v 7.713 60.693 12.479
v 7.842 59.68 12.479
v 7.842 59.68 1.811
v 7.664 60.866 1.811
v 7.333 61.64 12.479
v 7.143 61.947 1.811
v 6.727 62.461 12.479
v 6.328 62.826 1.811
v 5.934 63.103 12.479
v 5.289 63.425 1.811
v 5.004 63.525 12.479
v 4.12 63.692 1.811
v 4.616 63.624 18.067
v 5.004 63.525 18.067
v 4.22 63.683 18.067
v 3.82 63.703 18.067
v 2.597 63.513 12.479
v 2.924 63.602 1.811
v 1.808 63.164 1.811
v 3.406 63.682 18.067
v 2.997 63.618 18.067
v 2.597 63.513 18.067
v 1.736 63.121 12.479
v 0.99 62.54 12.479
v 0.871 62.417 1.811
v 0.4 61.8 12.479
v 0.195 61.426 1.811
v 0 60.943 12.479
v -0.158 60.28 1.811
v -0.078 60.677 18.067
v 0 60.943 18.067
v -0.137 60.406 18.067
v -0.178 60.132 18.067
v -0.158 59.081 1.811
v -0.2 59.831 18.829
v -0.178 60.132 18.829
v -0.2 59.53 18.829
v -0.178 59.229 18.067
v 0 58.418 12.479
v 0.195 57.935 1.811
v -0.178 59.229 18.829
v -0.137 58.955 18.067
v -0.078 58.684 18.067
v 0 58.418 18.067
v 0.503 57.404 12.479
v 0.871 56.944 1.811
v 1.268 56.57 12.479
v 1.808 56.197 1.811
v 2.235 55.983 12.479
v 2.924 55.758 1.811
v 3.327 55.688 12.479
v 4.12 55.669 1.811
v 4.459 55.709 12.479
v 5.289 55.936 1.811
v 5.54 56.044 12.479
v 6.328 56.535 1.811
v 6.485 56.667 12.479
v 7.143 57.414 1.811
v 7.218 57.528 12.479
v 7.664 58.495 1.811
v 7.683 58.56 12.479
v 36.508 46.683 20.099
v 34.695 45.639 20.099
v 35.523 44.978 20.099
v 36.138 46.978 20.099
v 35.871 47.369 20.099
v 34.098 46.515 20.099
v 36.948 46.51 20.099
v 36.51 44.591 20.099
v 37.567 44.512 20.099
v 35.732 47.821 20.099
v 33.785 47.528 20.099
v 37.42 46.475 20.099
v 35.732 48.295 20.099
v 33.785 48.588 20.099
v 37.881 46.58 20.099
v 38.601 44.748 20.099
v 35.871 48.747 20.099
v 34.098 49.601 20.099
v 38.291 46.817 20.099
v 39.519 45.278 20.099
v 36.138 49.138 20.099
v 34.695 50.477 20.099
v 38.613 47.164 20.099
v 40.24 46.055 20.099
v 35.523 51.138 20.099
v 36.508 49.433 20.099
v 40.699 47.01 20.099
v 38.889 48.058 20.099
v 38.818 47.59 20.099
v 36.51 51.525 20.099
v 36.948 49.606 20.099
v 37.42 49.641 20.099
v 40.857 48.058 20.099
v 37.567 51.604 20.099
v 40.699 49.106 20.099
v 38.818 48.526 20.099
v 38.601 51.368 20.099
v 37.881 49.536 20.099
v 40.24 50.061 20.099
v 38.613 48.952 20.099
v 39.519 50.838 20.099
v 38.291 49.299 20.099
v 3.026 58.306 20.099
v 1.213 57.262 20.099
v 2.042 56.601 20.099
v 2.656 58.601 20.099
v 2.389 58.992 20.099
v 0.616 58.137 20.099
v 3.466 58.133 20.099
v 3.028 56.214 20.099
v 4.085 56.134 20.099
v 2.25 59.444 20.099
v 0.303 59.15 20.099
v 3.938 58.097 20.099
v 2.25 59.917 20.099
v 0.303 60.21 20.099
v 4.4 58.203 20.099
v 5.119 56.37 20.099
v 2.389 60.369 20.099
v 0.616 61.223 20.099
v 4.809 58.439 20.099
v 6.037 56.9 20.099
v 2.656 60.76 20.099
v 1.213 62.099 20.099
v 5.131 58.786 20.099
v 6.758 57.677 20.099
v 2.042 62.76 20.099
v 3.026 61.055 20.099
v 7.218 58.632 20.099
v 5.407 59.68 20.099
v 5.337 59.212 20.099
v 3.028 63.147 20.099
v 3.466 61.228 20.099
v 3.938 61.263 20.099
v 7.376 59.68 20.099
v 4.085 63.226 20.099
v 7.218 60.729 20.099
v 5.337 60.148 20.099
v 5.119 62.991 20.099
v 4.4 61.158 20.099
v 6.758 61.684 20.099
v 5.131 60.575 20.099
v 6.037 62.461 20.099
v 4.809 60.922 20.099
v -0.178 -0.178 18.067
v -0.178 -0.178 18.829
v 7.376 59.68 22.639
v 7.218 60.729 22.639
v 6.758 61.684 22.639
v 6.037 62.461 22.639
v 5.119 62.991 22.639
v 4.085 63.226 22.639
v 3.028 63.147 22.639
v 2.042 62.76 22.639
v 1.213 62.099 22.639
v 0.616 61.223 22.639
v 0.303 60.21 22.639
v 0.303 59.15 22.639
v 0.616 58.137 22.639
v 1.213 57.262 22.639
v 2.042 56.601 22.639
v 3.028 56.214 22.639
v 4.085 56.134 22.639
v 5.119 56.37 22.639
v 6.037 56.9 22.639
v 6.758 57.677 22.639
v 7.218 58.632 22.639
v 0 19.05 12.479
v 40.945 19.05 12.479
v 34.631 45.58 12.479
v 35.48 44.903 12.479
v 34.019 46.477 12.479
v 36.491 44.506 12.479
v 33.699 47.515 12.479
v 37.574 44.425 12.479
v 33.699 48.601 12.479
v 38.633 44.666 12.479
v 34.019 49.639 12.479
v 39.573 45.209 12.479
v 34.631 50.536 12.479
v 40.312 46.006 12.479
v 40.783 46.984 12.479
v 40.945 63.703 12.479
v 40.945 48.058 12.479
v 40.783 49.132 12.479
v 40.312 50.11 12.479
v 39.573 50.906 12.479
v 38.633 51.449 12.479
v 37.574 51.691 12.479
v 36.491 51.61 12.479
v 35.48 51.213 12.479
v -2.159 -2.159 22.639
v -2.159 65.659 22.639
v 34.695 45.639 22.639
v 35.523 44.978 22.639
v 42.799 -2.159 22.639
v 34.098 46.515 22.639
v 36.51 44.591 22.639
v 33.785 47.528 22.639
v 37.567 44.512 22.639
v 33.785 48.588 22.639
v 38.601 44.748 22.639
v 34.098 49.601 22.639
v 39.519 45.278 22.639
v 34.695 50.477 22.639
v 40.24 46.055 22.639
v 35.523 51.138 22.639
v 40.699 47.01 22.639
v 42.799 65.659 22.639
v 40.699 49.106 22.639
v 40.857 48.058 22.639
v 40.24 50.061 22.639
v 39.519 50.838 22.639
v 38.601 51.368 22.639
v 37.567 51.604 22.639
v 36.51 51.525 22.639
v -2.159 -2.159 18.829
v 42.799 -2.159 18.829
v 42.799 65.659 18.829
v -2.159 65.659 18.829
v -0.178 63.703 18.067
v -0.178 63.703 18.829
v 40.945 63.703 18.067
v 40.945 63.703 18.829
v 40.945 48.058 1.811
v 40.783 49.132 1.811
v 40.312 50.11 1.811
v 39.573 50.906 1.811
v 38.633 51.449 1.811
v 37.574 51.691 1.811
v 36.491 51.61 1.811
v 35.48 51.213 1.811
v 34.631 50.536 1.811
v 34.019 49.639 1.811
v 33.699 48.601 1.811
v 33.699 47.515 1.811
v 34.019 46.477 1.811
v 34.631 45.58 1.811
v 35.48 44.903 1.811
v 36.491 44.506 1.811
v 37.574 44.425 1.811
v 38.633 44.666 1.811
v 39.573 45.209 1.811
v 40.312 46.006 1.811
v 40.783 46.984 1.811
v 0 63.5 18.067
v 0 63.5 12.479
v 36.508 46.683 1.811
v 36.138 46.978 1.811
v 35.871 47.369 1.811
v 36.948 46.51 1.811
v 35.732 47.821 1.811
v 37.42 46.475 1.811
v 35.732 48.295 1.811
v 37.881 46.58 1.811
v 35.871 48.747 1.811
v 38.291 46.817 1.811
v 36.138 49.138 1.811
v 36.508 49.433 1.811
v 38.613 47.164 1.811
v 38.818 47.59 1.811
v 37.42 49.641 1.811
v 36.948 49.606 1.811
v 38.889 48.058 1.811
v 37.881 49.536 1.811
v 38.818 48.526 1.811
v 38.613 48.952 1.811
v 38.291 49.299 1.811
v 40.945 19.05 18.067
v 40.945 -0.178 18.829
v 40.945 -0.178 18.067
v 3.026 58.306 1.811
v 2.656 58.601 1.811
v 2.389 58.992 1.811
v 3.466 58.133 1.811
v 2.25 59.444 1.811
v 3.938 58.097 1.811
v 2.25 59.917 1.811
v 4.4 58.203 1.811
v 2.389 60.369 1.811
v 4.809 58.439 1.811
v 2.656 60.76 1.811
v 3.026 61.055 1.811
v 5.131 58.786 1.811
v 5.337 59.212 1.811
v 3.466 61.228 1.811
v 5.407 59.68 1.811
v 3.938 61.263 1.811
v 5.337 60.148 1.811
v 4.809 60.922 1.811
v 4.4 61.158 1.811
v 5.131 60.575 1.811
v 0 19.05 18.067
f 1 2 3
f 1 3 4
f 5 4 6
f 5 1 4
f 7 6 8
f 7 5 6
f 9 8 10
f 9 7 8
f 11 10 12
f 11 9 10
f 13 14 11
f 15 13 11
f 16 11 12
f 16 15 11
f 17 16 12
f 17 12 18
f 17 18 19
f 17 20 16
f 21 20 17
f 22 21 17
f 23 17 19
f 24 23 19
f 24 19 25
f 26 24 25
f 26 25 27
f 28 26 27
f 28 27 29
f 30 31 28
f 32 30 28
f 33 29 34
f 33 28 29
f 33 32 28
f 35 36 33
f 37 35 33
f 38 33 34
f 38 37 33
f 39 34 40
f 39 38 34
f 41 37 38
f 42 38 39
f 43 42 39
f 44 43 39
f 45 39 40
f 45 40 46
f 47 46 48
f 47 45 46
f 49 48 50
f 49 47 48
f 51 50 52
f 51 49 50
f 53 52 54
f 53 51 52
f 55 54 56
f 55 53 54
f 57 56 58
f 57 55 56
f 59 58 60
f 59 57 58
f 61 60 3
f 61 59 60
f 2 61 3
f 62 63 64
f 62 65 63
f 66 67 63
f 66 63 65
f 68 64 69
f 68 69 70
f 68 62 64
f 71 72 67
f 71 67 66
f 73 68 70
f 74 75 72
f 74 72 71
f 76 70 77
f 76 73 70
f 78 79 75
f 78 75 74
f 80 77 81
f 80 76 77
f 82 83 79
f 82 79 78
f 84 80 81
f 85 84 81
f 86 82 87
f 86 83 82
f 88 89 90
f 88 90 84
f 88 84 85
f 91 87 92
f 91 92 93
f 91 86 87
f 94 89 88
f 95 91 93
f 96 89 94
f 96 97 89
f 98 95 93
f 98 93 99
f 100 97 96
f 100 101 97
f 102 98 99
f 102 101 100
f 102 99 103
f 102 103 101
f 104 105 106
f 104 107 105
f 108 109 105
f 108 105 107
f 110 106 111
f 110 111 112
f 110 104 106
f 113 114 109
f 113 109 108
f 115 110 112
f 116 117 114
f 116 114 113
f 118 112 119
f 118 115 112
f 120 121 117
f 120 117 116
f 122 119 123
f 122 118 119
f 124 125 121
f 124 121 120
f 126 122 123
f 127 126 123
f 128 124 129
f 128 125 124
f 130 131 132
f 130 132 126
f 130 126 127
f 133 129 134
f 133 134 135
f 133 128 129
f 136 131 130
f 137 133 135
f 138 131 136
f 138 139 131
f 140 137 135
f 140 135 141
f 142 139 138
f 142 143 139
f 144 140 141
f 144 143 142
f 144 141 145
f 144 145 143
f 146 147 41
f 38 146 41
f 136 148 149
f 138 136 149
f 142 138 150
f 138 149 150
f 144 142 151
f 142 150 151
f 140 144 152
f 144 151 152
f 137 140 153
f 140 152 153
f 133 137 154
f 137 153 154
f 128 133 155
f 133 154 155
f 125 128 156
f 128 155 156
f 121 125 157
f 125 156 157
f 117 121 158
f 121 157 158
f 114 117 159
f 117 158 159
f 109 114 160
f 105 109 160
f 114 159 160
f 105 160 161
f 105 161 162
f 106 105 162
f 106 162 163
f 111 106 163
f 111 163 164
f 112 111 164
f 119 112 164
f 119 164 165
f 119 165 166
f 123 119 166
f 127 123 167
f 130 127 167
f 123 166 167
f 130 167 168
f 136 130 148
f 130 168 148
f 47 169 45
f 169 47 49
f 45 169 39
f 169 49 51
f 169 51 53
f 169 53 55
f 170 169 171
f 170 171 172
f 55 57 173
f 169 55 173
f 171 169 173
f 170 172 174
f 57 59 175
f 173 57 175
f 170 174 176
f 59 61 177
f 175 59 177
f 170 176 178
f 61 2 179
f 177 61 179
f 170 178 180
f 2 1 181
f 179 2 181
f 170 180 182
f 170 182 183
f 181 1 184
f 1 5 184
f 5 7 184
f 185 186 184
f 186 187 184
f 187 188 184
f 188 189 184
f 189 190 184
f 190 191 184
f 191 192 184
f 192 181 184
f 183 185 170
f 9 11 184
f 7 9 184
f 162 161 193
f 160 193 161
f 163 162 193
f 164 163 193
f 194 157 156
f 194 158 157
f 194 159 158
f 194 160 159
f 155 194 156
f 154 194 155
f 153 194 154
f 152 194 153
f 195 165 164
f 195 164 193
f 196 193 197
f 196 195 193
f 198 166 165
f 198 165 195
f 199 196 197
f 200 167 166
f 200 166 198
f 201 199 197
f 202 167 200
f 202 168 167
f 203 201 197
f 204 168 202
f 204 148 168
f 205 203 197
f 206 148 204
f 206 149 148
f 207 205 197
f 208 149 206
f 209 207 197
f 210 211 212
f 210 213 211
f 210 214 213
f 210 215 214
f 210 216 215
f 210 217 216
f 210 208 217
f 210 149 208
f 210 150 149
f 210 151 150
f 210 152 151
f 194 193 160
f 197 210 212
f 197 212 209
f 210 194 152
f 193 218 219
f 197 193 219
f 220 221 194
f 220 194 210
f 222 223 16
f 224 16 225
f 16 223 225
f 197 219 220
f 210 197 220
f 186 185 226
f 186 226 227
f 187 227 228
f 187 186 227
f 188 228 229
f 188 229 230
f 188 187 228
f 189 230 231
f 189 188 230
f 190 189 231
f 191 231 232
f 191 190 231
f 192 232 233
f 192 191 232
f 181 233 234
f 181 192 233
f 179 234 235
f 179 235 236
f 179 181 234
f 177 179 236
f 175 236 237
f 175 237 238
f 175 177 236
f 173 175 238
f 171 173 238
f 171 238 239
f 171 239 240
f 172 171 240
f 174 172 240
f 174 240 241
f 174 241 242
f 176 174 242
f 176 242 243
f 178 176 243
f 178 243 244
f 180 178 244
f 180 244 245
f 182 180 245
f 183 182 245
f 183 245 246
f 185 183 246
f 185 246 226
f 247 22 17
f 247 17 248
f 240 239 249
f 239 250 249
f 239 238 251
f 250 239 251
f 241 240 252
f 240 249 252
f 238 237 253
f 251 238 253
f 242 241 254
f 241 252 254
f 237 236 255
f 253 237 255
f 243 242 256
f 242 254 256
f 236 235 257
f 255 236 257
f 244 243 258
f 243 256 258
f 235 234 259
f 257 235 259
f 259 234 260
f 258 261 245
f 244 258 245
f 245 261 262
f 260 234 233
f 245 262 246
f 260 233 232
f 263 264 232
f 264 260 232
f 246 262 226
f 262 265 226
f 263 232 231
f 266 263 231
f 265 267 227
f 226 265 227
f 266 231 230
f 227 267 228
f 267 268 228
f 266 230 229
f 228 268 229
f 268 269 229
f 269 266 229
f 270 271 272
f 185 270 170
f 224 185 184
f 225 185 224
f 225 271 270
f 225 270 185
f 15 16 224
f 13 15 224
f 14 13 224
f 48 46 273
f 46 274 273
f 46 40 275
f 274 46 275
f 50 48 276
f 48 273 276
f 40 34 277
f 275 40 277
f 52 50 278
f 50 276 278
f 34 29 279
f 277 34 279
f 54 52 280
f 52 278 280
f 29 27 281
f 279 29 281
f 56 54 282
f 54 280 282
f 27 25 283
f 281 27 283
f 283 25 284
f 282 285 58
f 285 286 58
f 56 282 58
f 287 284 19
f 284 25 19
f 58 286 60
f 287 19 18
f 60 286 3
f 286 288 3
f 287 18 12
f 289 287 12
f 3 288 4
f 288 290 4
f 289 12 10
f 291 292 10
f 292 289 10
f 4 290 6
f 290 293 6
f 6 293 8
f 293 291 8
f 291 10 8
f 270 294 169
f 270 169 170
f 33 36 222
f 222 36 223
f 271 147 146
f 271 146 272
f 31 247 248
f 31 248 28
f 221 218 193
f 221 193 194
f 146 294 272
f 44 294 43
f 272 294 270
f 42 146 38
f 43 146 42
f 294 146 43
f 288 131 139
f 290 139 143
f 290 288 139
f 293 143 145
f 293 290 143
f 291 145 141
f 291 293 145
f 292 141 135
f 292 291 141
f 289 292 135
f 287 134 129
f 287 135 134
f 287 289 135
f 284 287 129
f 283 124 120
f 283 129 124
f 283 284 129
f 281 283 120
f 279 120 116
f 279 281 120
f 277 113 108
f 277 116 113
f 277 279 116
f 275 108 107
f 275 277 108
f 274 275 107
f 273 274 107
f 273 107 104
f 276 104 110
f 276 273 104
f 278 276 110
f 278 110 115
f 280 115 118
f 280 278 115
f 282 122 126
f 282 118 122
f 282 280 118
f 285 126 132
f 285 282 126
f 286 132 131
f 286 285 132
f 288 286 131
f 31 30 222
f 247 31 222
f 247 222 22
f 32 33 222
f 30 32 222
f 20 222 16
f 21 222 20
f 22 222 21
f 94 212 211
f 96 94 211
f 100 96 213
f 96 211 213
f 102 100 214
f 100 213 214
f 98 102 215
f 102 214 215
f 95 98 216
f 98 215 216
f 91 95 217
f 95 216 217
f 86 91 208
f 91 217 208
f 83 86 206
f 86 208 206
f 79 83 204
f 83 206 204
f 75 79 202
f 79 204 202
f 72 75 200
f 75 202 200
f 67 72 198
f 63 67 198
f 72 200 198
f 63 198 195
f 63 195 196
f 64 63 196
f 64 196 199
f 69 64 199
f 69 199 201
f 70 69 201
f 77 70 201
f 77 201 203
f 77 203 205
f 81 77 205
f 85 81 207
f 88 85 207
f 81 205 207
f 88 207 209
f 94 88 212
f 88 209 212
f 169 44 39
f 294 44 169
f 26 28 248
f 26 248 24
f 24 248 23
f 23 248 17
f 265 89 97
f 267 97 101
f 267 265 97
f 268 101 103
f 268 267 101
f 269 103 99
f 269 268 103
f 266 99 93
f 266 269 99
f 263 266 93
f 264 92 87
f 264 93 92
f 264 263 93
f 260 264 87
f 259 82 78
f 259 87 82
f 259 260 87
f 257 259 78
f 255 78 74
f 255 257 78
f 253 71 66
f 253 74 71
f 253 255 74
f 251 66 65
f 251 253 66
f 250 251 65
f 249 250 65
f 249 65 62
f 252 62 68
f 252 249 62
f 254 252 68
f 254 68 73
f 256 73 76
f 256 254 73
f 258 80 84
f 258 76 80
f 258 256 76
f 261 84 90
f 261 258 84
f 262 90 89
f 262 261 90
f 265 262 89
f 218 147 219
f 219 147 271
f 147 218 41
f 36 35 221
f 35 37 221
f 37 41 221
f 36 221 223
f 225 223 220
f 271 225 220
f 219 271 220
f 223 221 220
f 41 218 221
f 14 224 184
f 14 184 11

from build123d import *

# Parameters (mm, degrees)
SKETCH006_W          = 44.958
SKETCH006_H          = 67.818
PAD003_DEPTH         = 3.81
SKETCH007_W          = 41.1226
SKETCH007_H          = 63.881
PAD004_DEPTH         = 0.762
SKETCH008_R          = 4.022821
SKETCH008_R_2        = 1.5875
SKETCH008_R_3        = 3.643361
PAD005_DEPTH         = 17.018
PAD006_DEPTH         = 6.35
SKETCH010_R          = 1.5875
POCKET003_DEPTH      = 17.019
POCKET003_DEPTH_BACK = 3.811
SKETCH011_R          = 3.556
POCKET004_DEPTH      = 2.54


with BuildPart() as part:
    # Sketch006 (on DatumPlane) → Pad003 (new body)
    with BuildSketch(Plane.XY.offset(18.829)):
        with Locations((20.32, 31.75)):
            Rectangle(SKETCH006_W, SKETCH006_H)
    extrude(amount=PAD003_DEPTH)

    # Sketch007 (on DatumPlane) → Pad004 (join)
    with BuildSketch(Plane.XY.offset(18.829)):
        with Locations((20.3835, 31.7627)):
            Rectangle(SKETCH007_W, SKETCH007_H)
    extrude(amount=-PAD004_DEPTH)

    # Sketch008 (on DatumPlane) → Pad005 (join)
    with BuildSketch(Plane.XY.offset(18.829)):
        with Locations((3.819621, 59.680379)):
            Circle(SKETCH008_R)
        with Locations((3.819621, 59.680379)):
            Circle(SKETCH008_R_2, mode=Mode.SUBTRACT)
        with Locations((37.301439, 48.057955)):
            Circle(SKETCH008_R_3)
        with Locations((37.301439, 48.057955)):
            Circle(SKETCH008_R_2, mode=Mode.SUBTRACT)
    extrude(amount=-PAD005_DEPTH)

    # Sketch009 (on DatumPlane) → Pad006 (join)
    with BuildSketch(Plane.XY.offset(18.829)):
        Polygon((0, 63.5), (0, 19.05), (40.9448, 19.05), (40.9448, 63.7032), align=None)
    extrude(amount=-PAD006_DEPTH)

    # Sketch010 (on DatumPlane) → Pocket003 (cut, two sides)
    with BuildSketch(Plane.XY.offset(18.829)) as pocket003_sk:
        with Locations((3.819621, 59.680379)):
            Circle(SKETCH010_R)
        with Locations((37.301439, 48.057955)):
            Circle(SKETCH010_R)
    extrude(amount=-POCKET003_DEPTH, mode=Mode.SUBTRACT)
    extrude(pocket003_sk.sketch, amount=POCKET003_DEPTH_BACK, mode=Mode.SUBTRACT)

    # Sketch011 (on Face5 of Pocket003) → Pocket004 (cut)
    with BuildSketch(Plane.XY.offset(22.639)):
        with Locations((3.819621, 59.680379)):
            Circle(SKETCH011_R)
        with Locations((37.301439, 48.057955)):
            Circle(SKETCH011_R)
    extrude(amount=-POCKET004_DEPTH, mode=Mode.SUBTRACT)


solid = part.part
